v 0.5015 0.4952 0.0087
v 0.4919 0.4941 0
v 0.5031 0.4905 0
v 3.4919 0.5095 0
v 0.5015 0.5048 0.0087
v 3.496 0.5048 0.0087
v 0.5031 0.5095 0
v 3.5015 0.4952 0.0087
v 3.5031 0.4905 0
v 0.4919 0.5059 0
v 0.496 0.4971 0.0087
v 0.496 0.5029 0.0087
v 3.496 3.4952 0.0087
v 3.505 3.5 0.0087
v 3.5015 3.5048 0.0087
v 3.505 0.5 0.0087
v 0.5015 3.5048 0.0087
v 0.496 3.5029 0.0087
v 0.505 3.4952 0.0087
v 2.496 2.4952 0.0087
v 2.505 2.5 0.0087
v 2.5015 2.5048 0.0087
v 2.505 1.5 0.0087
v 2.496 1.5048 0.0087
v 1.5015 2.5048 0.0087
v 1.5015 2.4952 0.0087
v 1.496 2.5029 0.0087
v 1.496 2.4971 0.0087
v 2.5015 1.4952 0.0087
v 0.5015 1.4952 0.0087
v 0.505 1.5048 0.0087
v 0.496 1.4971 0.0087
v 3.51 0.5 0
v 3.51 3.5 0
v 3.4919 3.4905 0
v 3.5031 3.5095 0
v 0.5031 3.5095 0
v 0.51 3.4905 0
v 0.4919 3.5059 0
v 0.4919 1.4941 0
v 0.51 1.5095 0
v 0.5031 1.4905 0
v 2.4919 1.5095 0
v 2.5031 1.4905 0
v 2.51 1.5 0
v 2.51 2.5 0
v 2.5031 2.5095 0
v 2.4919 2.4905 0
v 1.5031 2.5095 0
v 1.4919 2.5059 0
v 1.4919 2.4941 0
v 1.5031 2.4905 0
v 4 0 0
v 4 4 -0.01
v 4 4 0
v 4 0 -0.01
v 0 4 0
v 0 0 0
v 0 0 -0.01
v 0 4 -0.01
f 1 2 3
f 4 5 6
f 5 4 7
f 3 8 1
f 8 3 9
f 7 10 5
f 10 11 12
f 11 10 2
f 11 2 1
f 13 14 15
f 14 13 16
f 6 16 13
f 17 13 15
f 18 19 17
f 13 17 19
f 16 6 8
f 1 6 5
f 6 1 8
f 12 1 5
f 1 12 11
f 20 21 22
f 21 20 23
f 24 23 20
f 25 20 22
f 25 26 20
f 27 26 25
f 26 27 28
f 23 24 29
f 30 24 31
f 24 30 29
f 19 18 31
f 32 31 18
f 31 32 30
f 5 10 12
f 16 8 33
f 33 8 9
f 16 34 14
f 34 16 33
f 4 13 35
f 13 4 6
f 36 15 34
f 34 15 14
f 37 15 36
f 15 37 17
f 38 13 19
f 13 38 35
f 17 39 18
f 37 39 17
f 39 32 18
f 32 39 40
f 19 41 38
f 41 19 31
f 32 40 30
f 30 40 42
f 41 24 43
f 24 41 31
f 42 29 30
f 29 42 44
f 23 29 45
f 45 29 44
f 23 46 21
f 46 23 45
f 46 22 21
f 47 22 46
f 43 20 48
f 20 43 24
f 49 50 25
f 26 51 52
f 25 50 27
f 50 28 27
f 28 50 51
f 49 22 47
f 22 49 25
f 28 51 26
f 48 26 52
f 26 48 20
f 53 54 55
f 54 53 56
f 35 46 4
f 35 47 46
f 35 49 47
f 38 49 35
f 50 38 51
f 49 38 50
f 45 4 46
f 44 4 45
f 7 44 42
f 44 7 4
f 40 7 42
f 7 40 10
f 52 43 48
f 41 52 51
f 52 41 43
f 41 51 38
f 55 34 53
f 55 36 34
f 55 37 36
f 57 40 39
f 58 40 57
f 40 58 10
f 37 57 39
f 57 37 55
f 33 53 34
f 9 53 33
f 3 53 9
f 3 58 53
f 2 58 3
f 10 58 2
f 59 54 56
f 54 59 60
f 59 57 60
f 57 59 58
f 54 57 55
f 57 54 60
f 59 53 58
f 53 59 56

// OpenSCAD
hull(){
    translate([0.5, 0.5]) sphere(0.01);
    translate([1.5, 0.5]) sphere(0.01);
}
hull(){
    translate([1.5, 0.5]) sphere(0.01);
    translate([2.5, 0.5]) sphere(0.01);
}
hull(){
    translate([2.5, 0.5]) sphere(0.01);
    translate([3.5, 0.5]) sphere(0.01);
}
hull(){
    translate([3.5, 0.5]) sphere(0.01);
    translate([3.5, 1.5]) sphere(0.01);
}
hull(){
    translate([3.5, 1.5]) sphere(0.01);
    translate([3.5, 2.5]) sphere(0.01);
}
hull(){
    translate([3.5, 2.5]) sphere(0.01);
    translate([3.5, 3.5]) sphere(0.01);
}
hull(){
    translate([3.5, 3.5]) sphere(0.01);
    translate([2.5, 3.5]) sphere(0.01);
}
hull(){
    translate([2.5, 3.5]) sphere(0.01);
    translate([1.5, 3.5]) sphere(0.01);
}
hull(){
    translate([1.5, 3.5]) sphere(0.01);
    translate([0.5, 3.5]) sphere(0.01);
}
hull(){
    translate([0.5, 3.5]) sphere(0.01);
    translate([0.5, 2.5]) sphere(0.01);
}
hull(){
    translate([0.5, 2.5]) sphere(0.01);
    translate([0.5, 1.5]) sphere(0.01);
}
hull(){
    translate([0.5, 1.5]) sphere(0.01);
    translate([1.5, 1.5]) sphere(0.01);
}
hull(){
    translate([1.5, 1.5]) sphere(0.01);
    translate([2.5, 1.5]) sphere(0.01);
}
hull(){
    translate([2.5, 1.5]) sphere(0.01);
    translate([2.5, 2.5]) sphere(0.01);
}
hull(){
    translate([2.5, 2.5]) sphere(0.01);
    translate([1.5, 2.5]) sphere(0.01);
}
translate([0,0,-0.01]) color([0.1,0.1,0.1]) cube([4,4,0.01]);
